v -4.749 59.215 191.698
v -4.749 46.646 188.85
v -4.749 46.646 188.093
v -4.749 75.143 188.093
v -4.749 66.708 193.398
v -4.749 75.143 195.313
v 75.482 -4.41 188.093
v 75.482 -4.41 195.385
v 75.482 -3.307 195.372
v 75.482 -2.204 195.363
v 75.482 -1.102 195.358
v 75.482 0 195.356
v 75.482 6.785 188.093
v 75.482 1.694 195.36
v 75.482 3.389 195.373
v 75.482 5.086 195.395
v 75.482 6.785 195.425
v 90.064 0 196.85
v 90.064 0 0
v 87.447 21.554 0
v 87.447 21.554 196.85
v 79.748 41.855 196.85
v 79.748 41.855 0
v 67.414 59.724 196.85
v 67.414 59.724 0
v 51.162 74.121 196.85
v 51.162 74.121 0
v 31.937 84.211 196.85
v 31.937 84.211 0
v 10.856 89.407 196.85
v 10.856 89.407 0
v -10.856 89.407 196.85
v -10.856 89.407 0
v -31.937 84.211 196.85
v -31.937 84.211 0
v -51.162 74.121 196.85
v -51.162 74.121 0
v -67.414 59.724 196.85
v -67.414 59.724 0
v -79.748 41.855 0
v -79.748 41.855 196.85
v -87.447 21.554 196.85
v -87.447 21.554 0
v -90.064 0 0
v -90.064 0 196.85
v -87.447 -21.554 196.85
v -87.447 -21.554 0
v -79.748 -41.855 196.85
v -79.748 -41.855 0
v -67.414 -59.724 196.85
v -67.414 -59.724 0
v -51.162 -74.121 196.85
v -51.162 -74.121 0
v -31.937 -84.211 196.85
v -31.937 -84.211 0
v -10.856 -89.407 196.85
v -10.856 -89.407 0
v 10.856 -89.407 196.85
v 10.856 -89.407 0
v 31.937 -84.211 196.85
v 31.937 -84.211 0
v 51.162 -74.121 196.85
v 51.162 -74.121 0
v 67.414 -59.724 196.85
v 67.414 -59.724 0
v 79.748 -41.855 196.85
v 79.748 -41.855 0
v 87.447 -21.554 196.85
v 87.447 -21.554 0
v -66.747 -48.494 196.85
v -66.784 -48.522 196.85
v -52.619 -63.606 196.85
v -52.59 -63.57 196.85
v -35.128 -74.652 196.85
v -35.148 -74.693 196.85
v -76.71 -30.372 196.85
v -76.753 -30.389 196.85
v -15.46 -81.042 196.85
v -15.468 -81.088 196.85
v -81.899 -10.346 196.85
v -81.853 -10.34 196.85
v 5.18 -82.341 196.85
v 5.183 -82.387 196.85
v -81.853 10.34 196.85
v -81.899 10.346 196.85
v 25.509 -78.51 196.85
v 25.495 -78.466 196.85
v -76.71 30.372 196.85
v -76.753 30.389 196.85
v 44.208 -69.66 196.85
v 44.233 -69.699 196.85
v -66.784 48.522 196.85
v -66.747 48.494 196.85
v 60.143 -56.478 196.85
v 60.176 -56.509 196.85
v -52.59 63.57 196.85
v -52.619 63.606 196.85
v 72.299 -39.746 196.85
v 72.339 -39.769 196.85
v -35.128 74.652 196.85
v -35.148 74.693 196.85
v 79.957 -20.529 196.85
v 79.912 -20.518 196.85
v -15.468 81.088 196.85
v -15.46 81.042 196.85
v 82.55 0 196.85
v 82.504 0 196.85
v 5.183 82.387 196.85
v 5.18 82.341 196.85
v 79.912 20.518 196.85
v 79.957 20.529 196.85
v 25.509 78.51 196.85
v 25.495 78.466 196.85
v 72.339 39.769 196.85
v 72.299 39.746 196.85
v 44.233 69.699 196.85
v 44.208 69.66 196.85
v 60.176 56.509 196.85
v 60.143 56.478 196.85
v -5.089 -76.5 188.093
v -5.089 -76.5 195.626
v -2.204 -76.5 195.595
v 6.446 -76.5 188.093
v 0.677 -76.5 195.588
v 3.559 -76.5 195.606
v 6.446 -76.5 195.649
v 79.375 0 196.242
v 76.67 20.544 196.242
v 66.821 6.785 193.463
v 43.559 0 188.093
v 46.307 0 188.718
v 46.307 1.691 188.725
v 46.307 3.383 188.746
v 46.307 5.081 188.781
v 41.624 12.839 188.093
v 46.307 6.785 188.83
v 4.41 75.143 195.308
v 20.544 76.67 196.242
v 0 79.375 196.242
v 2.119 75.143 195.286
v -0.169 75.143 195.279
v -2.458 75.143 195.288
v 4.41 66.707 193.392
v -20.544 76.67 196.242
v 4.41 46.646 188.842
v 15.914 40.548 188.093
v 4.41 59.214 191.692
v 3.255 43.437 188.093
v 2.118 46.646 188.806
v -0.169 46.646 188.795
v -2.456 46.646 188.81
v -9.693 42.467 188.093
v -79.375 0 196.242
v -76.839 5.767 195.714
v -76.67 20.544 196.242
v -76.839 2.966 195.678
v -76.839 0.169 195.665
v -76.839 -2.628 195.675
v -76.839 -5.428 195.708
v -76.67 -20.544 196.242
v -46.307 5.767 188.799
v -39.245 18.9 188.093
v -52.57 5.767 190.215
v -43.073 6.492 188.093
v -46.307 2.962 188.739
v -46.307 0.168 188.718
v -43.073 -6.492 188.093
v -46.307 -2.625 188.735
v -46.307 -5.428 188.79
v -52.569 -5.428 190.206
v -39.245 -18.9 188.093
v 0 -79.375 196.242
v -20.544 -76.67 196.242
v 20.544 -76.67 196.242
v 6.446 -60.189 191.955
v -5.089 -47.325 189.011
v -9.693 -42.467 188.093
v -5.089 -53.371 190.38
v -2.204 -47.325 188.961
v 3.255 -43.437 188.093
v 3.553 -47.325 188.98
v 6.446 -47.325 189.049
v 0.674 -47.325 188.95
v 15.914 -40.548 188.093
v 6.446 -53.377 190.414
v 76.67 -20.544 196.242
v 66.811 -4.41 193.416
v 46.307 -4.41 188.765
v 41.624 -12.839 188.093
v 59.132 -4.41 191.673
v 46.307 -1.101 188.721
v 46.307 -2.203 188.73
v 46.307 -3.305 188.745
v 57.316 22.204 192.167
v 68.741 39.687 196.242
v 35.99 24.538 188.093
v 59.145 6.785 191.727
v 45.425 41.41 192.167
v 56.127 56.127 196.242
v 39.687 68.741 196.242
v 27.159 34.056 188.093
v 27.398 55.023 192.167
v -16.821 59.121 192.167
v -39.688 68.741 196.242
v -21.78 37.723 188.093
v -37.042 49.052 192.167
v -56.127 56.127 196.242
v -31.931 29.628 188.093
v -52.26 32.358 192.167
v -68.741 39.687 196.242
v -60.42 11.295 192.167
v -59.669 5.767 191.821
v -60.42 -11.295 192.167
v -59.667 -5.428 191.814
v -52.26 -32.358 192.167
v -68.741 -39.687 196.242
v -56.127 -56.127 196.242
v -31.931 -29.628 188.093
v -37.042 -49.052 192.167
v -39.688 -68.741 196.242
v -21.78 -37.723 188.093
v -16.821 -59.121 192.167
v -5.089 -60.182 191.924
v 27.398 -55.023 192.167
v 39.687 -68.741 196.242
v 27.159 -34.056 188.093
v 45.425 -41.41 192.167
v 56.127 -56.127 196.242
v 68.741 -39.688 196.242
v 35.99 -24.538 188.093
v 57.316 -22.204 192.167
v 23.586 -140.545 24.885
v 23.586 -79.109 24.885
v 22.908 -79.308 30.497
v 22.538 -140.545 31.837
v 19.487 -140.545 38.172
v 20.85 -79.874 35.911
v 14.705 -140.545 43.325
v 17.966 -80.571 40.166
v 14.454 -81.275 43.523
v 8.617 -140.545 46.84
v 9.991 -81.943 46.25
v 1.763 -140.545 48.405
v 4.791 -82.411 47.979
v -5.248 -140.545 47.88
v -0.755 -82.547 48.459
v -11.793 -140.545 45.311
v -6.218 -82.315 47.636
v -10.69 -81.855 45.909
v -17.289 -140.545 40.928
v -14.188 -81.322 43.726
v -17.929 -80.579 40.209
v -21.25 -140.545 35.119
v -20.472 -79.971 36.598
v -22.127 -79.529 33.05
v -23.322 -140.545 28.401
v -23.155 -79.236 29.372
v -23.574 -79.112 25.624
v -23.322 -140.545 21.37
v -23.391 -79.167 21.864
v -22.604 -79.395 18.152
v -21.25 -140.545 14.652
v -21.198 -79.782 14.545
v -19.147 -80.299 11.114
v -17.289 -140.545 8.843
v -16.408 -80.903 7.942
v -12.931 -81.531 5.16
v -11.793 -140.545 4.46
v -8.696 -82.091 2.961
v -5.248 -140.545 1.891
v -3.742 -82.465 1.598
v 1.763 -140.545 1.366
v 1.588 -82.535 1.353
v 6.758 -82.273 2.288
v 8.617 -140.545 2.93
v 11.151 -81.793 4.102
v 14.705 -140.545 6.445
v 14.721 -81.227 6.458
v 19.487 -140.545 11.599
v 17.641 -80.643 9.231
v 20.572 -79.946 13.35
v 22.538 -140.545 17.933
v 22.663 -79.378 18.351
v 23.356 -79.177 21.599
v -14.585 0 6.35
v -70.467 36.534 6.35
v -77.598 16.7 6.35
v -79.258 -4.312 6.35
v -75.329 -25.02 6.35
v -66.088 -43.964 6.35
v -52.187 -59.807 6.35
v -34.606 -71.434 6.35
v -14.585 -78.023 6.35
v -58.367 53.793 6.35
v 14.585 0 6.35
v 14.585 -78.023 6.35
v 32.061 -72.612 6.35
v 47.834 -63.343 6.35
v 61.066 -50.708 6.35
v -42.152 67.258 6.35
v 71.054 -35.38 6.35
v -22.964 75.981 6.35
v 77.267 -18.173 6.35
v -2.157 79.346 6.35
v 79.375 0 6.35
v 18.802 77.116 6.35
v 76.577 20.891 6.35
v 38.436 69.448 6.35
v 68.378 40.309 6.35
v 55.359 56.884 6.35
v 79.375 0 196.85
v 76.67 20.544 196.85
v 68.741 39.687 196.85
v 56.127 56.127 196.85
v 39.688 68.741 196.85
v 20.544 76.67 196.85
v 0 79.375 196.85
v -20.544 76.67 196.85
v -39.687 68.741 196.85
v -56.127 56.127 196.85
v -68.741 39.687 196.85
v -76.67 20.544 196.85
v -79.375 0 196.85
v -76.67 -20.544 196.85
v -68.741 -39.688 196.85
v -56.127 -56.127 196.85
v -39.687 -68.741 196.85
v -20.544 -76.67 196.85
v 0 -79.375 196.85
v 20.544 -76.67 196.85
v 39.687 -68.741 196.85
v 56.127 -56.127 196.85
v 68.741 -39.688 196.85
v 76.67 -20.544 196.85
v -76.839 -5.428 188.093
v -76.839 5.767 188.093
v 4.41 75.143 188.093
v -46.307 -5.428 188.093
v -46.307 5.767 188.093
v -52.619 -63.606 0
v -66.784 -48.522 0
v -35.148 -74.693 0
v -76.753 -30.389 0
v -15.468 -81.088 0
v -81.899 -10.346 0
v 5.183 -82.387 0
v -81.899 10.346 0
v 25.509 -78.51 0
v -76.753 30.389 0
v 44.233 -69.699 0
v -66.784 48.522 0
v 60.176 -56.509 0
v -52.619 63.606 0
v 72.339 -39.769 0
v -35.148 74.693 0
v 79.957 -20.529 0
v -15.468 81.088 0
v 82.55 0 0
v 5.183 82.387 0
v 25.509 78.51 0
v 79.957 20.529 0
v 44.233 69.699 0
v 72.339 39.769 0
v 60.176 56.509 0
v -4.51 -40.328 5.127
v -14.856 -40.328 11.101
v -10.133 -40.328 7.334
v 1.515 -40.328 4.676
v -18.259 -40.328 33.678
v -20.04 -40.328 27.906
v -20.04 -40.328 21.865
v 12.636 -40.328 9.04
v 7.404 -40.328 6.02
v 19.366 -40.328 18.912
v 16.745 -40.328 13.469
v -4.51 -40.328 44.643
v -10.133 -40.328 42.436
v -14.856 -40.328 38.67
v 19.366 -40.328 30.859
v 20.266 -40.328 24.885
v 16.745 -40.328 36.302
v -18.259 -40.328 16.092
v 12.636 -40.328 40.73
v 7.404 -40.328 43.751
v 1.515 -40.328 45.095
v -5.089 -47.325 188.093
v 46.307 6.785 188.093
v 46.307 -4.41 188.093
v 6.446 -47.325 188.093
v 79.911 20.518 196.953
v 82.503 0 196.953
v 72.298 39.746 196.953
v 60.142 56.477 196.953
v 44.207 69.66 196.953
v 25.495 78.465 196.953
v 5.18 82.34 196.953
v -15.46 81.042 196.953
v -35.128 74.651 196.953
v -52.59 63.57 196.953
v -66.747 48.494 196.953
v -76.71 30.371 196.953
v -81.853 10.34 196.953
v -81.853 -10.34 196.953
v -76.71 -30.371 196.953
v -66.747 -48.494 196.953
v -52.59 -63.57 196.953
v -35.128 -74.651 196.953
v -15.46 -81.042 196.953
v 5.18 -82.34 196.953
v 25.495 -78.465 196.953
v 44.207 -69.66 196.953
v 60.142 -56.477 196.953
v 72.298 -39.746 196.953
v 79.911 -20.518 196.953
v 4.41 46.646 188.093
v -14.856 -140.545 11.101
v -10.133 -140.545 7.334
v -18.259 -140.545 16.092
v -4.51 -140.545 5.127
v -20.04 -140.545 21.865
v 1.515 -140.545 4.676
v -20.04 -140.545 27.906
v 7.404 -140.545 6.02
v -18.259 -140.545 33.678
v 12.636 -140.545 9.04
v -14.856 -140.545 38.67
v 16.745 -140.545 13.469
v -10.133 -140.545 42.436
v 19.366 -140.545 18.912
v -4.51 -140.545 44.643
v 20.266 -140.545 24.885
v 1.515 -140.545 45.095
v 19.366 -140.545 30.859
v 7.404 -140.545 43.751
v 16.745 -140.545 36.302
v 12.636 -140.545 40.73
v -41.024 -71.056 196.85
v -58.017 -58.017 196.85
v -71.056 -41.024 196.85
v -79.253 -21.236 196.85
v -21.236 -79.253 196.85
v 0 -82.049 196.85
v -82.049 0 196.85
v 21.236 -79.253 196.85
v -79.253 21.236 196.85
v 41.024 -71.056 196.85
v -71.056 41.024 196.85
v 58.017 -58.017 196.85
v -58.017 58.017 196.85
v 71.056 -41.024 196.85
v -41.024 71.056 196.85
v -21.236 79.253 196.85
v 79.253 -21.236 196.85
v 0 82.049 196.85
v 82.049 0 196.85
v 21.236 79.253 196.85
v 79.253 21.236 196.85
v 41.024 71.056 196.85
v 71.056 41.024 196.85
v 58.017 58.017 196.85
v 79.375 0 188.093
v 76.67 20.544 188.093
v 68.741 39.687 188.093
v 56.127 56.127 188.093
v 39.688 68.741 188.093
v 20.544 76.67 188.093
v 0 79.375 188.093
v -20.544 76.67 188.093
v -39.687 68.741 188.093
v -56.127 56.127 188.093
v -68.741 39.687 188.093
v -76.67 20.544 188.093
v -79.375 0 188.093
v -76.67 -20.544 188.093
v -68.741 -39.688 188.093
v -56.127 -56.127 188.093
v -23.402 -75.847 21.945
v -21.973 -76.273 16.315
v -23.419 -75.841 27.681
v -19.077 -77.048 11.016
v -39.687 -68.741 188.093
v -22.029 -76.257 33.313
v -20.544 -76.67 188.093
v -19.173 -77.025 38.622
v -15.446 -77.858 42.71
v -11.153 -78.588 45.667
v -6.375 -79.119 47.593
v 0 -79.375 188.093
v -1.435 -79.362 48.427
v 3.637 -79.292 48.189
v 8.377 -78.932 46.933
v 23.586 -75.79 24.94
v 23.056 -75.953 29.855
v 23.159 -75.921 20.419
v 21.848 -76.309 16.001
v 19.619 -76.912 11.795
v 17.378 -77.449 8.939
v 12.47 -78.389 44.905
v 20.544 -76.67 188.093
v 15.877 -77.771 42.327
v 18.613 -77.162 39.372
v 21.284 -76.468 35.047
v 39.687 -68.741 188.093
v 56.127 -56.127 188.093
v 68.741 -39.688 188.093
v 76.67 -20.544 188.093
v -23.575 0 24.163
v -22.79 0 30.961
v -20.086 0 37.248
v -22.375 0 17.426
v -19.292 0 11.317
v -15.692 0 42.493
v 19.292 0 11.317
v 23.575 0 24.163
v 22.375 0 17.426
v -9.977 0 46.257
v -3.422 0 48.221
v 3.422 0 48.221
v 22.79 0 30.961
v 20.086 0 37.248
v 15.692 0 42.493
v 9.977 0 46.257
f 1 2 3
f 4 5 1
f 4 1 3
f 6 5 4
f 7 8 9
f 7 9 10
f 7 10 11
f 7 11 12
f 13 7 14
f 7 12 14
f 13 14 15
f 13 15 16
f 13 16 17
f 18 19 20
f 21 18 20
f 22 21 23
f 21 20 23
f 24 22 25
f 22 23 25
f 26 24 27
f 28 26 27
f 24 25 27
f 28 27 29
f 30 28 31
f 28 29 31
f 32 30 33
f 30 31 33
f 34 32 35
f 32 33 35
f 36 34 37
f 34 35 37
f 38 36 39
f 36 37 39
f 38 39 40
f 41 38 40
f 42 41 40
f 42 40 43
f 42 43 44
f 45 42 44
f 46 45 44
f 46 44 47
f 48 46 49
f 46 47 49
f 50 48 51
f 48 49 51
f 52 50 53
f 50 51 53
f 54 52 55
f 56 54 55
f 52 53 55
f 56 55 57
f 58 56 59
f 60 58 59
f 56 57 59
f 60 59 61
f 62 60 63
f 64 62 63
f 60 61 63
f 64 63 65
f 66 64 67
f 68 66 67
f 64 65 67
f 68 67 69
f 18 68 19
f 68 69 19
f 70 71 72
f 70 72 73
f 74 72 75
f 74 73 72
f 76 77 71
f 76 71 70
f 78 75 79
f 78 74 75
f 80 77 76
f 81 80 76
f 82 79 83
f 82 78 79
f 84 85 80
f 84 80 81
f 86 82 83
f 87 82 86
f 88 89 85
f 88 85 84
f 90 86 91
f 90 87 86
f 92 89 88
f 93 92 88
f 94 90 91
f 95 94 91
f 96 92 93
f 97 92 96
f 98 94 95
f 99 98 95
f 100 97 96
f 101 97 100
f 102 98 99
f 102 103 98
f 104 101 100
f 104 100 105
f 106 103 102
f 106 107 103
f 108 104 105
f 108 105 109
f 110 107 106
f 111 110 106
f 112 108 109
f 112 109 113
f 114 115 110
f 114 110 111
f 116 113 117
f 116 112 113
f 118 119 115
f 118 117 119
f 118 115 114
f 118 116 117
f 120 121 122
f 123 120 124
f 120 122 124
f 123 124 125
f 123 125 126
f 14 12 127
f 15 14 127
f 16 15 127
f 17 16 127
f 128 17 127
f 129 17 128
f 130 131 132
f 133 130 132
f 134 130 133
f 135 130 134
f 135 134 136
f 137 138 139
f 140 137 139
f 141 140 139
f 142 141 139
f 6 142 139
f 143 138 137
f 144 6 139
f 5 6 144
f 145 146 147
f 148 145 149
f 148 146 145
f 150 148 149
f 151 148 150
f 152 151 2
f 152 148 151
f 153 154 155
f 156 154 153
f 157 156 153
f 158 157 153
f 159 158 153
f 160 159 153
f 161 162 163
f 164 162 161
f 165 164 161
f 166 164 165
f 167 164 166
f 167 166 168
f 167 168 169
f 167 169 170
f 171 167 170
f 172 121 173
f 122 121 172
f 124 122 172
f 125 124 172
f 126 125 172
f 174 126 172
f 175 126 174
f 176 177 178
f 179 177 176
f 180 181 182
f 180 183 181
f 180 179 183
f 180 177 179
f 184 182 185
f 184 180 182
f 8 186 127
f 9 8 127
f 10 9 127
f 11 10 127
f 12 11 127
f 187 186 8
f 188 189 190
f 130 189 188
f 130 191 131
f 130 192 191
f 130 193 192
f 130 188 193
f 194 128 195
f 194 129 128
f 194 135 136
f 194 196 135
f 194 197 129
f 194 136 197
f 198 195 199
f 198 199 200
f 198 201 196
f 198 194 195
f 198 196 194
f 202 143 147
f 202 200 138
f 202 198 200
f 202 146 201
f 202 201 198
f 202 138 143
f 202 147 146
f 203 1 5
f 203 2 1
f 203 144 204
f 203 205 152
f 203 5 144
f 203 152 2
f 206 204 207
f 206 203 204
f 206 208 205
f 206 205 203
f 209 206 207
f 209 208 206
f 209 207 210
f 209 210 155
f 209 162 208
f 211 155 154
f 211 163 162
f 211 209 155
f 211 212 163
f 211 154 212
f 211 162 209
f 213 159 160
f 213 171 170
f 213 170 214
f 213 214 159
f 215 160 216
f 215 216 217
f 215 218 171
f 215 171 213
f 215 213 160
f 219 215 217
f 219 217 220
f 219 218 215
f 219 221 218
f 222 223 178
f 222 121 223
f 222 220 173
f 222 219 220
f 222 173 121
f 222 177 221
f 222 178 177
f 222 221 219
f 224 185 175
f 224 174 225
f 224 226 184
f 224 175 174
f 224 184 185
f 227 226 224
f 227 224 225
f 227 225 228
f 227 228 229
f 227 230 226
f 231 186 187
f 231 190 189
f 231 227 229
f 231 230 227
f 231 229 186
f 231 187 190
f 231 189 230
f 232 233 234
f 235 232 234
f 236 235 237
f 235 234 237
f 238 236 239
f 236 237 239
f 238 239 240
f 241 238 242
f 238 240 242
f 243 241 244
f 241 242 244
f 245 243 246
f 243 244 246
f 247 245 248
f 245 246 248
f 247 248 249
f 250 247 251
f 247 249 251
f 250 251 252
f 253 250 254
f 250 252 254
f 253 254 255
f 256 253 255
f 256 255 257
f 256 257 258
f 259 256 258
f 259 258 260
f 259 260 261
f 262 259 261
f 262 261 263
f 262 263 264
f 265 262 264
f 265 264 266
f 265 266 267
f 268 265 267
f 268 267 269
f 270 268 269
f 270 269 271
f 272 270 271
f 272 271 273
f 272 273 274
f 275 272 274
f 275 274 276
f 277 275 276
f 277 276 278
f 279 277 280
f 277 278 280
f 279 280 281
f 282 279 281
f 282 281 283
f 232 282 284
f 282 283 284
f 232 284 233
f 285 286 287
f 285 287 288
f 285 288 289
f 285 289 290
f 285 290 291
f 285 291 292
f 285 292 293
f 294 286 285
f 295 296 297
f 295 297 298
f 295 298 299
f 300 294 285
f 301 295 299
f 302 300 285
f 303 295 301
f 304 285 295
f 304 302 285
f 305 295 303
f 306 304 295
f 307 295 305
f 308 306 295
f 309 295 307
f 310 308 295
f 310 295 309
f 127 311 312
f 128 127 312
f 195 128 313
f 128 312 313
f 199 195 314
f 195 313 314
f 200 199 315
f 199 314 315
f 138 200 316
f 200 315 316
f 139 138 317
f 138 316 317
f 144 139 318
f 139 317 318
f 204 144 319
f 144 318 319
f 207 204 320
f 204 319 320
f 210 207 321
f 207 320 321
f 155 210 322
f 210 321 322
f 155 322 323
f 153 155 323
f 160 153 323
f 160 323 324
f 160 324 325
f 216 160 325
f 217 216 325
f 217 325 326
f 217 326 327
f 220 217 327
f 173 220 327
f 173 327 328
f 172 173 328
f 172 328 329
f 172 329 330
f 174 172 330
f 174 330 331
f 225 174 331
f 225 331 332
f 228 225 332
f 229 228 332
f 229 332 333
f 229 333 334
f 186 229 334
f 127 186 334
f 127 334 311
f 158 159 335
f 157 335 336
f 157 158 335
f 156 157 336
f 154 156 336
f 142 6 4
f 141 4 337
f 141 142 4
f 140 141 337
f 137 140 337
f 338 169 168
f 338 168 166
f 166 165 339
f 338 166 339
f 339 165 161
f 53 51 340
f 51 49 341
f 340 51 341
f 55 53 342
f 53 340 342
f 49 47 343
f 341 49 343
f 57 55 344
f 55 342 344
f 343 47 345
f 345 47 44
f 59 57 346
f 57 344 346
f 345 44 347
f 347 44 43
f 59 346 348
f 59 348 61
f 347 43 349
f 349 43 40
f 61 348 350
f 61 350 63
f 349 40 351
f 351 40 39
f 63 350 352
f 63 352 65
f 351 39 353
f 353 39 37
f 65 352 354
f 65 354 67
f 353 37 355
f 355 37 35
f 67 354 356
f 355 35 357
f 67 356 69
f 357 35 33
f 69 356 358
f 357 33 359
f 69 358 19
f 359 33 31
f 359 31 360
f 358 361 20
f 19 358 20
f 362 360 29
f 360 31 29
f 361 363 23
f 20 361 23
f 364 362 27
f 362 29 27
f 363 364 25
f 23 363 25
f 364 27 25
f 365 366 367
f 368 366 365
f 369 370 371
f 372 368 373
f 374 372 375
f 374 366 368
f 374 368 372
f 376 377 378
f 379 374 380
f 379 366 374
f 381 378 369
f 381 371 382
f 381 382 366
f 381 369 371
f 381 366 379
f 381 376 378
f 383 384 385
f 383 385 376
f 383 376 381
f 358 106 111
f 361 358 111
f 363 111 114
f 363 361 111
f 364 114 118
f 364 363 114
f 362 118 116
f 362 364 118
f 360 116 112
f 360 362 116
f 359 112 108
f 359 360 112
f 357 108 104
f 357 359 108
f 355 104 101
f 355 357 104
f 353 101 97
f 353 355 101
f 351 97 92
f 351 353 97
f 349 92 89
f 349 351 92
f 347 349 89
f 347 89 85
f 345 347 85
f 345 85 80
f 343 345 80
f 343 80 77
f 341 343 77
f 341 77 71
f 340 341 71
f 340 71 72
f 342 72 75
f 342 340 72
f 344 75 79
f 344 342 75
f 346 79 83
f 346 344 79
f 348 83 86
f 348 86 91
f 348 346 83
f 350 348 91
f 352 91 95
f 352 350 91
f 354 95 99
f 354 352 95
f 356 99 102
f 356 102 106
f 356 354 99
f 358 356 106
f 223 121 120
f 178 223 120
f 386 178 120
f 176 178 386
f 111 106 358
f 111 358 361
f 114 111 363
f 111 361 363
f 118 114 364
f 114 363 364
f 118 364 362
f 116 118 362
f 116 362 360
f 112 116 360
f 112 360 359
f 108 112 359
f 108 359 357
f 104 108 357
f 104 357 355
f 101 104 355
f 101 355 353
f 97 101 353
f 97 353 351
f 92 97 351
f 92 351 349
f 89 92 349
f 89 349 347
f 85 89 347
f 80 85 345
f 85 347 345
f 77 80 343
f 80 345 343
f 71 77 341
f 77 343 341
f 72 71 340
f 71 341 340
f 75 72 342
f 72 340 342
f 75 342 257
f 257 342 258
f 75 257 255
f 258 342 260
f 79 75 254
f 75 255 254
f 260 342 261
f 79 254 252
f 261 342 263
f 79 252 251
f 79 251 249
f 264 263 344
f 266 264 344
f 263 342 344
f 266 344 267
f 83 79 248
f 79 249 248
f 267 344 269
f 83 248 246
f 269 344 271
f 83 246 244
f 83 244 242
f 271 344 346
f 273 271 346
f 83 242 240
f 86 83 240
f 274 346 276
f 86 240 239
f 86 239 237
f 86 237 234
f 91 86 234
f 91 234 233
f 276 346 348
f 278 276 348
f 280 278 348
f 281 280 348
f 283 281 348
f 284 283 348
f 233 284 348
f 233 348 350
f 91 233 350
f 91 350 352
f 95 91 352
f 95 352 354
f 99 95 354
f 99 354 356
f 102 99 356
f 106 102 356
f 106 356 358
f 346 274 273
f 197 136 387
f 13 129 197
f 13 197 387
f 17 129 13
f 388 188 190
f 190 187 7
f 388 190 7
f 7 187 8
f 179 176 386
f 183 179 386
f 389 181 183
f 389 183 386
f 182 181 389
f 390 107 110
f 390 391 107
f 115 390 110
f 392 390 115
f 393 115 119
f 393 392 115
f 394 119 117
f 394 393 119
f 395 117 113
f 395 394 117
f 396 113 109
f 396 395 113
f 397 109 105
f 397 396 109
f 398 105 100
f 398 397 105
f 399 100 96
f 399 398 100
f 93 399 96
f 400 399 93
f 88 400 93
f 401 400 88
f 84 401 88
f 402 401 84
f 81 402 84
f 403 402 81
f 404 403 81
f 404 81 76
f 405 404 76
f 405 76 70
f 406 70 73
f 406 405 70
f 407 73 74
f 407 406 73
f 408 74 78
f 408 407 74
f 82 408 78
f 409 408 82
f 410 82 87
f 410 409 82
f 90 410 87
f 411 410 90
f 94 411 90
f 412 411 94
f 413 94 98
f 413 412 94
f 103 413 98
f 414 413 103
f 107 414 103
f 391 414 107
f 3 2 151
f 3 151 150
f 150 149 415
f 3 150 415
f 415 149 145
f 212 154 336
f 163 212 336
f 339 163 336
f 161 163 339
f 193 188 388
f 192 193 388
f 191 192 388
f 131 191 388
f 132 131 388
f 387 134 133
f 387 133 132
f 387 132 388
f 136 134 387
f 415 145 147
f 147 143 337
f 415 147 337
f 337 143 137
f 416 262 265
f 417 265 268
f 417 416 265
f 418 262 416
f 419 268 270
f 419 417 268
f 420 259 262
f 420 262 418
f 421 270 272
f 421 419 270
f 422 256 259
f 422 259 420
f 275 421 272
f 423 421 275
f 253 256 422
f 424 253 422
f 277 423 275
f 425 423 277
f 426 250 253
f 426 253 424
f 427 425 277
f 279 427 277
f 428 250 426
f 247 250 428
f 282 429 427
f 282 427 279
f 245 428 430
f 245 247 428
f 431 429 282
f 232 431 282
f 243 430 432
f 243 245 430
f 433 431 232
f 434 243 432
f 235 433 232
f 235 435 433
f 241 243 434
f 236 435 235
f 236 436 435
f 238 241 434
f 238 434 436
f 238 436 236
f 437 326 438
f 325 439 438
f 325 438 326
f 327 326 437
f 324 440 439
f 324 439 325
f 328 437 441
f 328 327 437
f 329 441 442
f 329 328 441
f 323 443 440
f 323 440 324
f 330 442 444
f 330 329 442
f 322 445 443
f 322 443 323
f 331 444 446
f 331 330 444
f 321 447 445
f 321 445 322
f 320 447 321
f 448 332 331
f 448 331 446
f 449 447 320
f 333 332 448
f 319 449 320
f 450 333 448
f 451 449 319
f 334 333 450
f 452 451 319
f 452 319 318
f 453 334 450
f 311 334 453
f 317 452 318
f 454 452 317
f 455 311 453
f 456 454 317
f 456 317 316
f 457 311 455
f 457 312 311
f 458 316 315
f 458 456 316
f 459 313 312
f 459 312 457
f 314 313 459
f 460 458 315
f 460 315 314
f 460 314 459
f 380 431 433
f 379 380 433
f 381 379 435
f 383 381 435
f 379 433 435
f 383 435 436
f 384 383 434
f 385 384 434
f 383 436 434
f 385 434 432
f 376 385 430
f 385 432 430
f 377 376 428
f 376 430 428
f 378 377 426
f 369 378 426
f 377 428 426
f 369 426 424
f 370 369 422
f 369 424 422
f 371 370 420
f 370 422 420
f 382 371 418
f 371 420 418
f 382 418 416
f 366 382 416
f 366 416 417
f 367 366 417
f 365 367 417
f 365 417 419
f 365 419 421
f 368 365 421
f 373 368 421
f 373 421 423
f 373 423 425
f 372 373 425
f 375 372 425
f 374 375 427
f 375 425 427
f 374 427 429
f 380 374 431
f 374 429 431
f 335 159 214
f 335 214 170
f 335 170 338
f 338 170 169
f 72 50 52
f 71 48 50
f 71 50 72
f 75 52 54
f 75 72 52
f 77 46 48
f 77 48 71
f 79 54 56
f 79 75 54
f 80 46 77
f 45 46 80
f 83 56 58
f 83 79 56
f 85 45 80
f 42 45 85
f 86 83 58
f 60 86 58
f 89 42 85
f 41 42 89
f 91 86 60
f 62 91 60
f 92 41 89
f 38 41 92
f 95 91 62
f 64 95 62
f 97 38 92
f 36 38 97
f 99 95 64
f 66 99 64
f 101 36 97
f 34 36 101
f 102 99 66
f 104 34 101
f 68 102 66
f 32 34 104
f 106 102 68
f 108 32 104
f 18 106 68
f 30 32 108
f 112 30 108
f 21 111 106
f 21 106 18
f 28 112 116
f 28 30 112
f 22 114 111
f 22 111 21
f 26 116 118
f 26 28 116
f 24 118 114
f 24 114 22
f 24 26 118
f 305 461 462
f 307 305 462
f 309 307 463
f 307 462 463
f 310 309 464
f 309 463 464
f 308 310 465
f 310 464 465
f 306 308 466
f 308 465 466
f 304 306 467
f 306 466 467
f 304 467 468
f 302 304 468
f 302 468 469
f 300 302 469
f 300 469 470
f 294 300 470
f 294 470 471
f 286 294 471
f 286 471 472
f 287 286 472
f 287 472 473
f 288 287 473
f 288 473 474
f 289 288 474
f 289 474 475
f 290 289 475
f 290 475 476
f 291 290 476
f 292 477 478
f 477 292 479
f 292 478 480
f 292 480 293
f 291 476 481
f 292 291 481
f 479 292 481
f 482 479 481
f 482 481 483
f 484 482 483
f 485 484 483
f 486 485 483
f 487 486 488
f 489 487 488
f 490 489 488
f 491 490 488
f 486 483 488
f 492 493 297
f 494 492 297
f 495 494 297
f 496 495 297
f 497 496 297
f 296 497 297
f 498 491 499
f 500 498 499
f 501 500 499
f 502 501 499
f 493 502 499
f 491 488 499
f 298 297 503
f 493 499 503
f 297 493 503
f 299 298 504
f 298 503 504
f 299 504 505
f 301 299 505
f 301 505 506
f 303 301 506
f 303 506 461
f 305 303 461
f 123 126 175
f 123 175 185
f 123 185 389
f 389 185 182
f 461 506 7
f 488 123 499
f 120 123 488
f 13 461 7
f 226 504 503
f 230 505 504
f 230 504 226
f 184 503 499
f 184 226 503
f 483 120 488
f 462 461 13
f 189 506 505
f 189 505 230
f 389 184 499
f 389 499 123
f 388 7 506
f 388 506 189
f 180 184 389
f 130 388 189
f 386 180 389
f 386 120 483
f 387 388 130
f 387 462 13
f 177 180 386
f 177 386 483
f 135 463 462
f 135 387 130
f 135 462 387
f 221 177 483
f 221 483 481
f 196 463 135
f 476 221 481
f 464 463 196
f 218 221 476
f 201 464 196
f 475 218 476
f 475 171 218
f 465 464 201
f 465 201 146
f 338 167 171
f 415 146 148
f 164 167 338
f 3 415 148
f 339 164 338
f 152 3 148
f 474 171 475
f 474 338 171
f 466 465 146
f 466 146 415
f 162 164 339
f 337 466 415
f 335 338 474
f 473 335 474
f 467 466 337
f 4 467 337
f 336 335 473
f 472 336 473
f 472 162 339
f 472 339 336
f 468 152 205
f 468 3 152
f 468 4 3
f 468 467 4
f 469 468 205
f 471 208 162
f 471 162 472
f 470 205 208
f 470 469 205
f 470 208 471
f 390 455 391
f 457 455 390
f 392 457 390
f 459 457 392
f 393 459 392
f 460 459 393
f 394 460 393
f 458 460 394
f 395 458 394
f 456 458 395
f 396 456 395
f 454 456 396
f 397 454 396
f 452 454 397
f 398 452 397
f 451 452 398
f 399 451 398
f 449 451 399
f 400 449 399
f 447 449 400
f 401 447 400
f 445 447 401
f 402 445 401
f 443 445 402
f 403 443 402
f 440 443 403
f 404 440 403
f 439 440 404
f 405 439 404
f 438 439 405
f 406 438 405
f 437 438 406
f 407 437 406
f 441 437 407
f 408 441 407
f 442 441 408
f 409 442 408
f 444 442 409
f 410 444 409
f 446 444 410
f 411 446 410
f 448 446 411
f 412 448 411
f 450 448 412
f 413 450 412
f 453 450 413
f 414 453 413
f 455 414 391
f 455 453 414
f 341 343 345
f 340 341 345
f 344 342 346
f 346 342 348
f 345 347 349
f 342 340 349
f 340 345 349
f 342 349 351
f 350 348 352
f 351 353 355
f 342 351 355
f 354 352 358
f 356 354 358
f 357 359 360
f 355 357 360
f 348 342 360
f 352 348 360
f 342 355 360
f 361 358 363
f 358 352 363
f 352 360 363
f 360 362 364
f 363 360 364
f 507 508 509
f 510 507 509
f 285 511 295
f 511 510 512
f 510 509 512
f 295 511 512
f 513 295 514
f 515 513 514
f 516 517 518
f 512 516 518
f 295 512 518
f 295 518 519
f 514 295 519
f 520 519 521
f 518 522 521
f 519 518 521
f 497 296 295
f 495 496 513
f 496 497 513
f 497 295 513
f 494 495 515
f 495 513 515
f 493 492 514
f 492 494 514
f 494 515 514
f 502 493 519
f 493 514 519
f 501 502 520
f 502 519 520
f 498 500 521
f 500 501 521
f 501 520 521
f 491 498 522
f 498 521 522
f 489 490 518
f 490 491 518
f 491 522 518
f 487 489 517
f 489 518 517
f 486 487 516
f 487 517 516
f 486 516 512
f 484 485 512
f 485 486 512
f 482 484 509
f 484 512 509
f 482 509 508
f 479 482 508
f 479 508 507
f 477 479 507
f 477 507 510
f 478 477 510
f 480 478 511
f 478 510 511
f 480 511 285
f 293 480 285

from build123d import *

# Parameters (mm, degrees)
F0_R      = 82.55
F1_DEPTH  = 196.85
F2_R      = 79.375
F3_DEPTH  = 190.5
F9_W      = 9.1596553102
F9_H      = 28.4967124462
F9_W_2    = 29.1752070189
F9_H_2    = 11.1951339059
F9_W_3    = 30.5321961641
F9_H_3    = 11.1951371655
F9_W_4    = 11.5343825892
F9_H_4    = 29.1751995683
F10_DEPTH = 50.8
F11_R     = 23.5856126994
F12_DEPTH = 140.54548
F13_R     = 20.2662897719
F14_DEPTH = 100.21757
F15_R     = 90.0641643282
F15_R_2   = 82.55
F16_DEPTH = 196.85


# Not quite as in the source:
# - the program builds the solid bodies; features that only make, move or delete a surface that nothing else refers to are left out


with BuildPart() as f1:
    # F0 (on Top) → F1 (new body)
    with BuildSketch(Plane.XY):
        Circle(F0_R)
    extrude(amount=F1_DEPTH)

    # F2 (on face) → F3 (cut)
    with BuildSketch(Plane.XY.offset(196.85)):
        Circle(F2_R)
    extrude(amount=-F3_DEPTH, mode=Mode.SUBTRACT)

    # F7 (on Front) → F8 (revolve)
    with BuildSketch(Plane.XZ):
        Polygon((82.5372104228, 188.0925446749), (82.5032889843, 196.9533860683), (43.5591638088, 188.0925446749), align=None)
    revolve(axis=Axis((0, 0, 196.85), (0, 0, 1)))

    # F9 (on offset) → F10 (cut)
    with BuildSketch(Plane.XY.offset(196.85)):
        with Locations((-0.1696236432, 60.8947575092)):
            Rectangle(F9_W, F9_H)
        with Locations((60.8947575092, 1.187362941)):
            Rectangle(F9_W_2, F9_H_2)
        with Locations((-61.5732520819, 0.1696236432)):
            Rectangle(F9_W_3, F9_H_3)
        with Locations((0.6784931757, -61.9124956429)):
            Rectangle(F9_W_4, F9_H_4)
    extrude(amount=-F10_DEPTH, mode=Mode.SUBTRACT)

    # F11 (on Front) → F12 (join)
    with BuildSketch(Plane.XZ):
        with Locations((0, 24.8852539808)):
            Circle(F11_R)
    extrude(amount=F12_DEPTH)

    # F13 (on face) → F14 (cut)
    with BuildSketch(Plane.XZ.offset(140.54548)):
        with Locations((0, 24.8852539808)):
            Circle(F13_R)
    extrude(amount=-F14_DEPTH, mode=Mode.SUBTRACT)


with BuildPart() as f16:
    # F15 (on Top) → F16 (new body)
    with BuildSketch(Plane.XY):
        Circle(F15_R)
        Circle(F15_R_2, mode=Mode.SUBTRACT)
    extrude(amount=F16_DEPTH)


solid = Compound([f1.part, f16.part])
